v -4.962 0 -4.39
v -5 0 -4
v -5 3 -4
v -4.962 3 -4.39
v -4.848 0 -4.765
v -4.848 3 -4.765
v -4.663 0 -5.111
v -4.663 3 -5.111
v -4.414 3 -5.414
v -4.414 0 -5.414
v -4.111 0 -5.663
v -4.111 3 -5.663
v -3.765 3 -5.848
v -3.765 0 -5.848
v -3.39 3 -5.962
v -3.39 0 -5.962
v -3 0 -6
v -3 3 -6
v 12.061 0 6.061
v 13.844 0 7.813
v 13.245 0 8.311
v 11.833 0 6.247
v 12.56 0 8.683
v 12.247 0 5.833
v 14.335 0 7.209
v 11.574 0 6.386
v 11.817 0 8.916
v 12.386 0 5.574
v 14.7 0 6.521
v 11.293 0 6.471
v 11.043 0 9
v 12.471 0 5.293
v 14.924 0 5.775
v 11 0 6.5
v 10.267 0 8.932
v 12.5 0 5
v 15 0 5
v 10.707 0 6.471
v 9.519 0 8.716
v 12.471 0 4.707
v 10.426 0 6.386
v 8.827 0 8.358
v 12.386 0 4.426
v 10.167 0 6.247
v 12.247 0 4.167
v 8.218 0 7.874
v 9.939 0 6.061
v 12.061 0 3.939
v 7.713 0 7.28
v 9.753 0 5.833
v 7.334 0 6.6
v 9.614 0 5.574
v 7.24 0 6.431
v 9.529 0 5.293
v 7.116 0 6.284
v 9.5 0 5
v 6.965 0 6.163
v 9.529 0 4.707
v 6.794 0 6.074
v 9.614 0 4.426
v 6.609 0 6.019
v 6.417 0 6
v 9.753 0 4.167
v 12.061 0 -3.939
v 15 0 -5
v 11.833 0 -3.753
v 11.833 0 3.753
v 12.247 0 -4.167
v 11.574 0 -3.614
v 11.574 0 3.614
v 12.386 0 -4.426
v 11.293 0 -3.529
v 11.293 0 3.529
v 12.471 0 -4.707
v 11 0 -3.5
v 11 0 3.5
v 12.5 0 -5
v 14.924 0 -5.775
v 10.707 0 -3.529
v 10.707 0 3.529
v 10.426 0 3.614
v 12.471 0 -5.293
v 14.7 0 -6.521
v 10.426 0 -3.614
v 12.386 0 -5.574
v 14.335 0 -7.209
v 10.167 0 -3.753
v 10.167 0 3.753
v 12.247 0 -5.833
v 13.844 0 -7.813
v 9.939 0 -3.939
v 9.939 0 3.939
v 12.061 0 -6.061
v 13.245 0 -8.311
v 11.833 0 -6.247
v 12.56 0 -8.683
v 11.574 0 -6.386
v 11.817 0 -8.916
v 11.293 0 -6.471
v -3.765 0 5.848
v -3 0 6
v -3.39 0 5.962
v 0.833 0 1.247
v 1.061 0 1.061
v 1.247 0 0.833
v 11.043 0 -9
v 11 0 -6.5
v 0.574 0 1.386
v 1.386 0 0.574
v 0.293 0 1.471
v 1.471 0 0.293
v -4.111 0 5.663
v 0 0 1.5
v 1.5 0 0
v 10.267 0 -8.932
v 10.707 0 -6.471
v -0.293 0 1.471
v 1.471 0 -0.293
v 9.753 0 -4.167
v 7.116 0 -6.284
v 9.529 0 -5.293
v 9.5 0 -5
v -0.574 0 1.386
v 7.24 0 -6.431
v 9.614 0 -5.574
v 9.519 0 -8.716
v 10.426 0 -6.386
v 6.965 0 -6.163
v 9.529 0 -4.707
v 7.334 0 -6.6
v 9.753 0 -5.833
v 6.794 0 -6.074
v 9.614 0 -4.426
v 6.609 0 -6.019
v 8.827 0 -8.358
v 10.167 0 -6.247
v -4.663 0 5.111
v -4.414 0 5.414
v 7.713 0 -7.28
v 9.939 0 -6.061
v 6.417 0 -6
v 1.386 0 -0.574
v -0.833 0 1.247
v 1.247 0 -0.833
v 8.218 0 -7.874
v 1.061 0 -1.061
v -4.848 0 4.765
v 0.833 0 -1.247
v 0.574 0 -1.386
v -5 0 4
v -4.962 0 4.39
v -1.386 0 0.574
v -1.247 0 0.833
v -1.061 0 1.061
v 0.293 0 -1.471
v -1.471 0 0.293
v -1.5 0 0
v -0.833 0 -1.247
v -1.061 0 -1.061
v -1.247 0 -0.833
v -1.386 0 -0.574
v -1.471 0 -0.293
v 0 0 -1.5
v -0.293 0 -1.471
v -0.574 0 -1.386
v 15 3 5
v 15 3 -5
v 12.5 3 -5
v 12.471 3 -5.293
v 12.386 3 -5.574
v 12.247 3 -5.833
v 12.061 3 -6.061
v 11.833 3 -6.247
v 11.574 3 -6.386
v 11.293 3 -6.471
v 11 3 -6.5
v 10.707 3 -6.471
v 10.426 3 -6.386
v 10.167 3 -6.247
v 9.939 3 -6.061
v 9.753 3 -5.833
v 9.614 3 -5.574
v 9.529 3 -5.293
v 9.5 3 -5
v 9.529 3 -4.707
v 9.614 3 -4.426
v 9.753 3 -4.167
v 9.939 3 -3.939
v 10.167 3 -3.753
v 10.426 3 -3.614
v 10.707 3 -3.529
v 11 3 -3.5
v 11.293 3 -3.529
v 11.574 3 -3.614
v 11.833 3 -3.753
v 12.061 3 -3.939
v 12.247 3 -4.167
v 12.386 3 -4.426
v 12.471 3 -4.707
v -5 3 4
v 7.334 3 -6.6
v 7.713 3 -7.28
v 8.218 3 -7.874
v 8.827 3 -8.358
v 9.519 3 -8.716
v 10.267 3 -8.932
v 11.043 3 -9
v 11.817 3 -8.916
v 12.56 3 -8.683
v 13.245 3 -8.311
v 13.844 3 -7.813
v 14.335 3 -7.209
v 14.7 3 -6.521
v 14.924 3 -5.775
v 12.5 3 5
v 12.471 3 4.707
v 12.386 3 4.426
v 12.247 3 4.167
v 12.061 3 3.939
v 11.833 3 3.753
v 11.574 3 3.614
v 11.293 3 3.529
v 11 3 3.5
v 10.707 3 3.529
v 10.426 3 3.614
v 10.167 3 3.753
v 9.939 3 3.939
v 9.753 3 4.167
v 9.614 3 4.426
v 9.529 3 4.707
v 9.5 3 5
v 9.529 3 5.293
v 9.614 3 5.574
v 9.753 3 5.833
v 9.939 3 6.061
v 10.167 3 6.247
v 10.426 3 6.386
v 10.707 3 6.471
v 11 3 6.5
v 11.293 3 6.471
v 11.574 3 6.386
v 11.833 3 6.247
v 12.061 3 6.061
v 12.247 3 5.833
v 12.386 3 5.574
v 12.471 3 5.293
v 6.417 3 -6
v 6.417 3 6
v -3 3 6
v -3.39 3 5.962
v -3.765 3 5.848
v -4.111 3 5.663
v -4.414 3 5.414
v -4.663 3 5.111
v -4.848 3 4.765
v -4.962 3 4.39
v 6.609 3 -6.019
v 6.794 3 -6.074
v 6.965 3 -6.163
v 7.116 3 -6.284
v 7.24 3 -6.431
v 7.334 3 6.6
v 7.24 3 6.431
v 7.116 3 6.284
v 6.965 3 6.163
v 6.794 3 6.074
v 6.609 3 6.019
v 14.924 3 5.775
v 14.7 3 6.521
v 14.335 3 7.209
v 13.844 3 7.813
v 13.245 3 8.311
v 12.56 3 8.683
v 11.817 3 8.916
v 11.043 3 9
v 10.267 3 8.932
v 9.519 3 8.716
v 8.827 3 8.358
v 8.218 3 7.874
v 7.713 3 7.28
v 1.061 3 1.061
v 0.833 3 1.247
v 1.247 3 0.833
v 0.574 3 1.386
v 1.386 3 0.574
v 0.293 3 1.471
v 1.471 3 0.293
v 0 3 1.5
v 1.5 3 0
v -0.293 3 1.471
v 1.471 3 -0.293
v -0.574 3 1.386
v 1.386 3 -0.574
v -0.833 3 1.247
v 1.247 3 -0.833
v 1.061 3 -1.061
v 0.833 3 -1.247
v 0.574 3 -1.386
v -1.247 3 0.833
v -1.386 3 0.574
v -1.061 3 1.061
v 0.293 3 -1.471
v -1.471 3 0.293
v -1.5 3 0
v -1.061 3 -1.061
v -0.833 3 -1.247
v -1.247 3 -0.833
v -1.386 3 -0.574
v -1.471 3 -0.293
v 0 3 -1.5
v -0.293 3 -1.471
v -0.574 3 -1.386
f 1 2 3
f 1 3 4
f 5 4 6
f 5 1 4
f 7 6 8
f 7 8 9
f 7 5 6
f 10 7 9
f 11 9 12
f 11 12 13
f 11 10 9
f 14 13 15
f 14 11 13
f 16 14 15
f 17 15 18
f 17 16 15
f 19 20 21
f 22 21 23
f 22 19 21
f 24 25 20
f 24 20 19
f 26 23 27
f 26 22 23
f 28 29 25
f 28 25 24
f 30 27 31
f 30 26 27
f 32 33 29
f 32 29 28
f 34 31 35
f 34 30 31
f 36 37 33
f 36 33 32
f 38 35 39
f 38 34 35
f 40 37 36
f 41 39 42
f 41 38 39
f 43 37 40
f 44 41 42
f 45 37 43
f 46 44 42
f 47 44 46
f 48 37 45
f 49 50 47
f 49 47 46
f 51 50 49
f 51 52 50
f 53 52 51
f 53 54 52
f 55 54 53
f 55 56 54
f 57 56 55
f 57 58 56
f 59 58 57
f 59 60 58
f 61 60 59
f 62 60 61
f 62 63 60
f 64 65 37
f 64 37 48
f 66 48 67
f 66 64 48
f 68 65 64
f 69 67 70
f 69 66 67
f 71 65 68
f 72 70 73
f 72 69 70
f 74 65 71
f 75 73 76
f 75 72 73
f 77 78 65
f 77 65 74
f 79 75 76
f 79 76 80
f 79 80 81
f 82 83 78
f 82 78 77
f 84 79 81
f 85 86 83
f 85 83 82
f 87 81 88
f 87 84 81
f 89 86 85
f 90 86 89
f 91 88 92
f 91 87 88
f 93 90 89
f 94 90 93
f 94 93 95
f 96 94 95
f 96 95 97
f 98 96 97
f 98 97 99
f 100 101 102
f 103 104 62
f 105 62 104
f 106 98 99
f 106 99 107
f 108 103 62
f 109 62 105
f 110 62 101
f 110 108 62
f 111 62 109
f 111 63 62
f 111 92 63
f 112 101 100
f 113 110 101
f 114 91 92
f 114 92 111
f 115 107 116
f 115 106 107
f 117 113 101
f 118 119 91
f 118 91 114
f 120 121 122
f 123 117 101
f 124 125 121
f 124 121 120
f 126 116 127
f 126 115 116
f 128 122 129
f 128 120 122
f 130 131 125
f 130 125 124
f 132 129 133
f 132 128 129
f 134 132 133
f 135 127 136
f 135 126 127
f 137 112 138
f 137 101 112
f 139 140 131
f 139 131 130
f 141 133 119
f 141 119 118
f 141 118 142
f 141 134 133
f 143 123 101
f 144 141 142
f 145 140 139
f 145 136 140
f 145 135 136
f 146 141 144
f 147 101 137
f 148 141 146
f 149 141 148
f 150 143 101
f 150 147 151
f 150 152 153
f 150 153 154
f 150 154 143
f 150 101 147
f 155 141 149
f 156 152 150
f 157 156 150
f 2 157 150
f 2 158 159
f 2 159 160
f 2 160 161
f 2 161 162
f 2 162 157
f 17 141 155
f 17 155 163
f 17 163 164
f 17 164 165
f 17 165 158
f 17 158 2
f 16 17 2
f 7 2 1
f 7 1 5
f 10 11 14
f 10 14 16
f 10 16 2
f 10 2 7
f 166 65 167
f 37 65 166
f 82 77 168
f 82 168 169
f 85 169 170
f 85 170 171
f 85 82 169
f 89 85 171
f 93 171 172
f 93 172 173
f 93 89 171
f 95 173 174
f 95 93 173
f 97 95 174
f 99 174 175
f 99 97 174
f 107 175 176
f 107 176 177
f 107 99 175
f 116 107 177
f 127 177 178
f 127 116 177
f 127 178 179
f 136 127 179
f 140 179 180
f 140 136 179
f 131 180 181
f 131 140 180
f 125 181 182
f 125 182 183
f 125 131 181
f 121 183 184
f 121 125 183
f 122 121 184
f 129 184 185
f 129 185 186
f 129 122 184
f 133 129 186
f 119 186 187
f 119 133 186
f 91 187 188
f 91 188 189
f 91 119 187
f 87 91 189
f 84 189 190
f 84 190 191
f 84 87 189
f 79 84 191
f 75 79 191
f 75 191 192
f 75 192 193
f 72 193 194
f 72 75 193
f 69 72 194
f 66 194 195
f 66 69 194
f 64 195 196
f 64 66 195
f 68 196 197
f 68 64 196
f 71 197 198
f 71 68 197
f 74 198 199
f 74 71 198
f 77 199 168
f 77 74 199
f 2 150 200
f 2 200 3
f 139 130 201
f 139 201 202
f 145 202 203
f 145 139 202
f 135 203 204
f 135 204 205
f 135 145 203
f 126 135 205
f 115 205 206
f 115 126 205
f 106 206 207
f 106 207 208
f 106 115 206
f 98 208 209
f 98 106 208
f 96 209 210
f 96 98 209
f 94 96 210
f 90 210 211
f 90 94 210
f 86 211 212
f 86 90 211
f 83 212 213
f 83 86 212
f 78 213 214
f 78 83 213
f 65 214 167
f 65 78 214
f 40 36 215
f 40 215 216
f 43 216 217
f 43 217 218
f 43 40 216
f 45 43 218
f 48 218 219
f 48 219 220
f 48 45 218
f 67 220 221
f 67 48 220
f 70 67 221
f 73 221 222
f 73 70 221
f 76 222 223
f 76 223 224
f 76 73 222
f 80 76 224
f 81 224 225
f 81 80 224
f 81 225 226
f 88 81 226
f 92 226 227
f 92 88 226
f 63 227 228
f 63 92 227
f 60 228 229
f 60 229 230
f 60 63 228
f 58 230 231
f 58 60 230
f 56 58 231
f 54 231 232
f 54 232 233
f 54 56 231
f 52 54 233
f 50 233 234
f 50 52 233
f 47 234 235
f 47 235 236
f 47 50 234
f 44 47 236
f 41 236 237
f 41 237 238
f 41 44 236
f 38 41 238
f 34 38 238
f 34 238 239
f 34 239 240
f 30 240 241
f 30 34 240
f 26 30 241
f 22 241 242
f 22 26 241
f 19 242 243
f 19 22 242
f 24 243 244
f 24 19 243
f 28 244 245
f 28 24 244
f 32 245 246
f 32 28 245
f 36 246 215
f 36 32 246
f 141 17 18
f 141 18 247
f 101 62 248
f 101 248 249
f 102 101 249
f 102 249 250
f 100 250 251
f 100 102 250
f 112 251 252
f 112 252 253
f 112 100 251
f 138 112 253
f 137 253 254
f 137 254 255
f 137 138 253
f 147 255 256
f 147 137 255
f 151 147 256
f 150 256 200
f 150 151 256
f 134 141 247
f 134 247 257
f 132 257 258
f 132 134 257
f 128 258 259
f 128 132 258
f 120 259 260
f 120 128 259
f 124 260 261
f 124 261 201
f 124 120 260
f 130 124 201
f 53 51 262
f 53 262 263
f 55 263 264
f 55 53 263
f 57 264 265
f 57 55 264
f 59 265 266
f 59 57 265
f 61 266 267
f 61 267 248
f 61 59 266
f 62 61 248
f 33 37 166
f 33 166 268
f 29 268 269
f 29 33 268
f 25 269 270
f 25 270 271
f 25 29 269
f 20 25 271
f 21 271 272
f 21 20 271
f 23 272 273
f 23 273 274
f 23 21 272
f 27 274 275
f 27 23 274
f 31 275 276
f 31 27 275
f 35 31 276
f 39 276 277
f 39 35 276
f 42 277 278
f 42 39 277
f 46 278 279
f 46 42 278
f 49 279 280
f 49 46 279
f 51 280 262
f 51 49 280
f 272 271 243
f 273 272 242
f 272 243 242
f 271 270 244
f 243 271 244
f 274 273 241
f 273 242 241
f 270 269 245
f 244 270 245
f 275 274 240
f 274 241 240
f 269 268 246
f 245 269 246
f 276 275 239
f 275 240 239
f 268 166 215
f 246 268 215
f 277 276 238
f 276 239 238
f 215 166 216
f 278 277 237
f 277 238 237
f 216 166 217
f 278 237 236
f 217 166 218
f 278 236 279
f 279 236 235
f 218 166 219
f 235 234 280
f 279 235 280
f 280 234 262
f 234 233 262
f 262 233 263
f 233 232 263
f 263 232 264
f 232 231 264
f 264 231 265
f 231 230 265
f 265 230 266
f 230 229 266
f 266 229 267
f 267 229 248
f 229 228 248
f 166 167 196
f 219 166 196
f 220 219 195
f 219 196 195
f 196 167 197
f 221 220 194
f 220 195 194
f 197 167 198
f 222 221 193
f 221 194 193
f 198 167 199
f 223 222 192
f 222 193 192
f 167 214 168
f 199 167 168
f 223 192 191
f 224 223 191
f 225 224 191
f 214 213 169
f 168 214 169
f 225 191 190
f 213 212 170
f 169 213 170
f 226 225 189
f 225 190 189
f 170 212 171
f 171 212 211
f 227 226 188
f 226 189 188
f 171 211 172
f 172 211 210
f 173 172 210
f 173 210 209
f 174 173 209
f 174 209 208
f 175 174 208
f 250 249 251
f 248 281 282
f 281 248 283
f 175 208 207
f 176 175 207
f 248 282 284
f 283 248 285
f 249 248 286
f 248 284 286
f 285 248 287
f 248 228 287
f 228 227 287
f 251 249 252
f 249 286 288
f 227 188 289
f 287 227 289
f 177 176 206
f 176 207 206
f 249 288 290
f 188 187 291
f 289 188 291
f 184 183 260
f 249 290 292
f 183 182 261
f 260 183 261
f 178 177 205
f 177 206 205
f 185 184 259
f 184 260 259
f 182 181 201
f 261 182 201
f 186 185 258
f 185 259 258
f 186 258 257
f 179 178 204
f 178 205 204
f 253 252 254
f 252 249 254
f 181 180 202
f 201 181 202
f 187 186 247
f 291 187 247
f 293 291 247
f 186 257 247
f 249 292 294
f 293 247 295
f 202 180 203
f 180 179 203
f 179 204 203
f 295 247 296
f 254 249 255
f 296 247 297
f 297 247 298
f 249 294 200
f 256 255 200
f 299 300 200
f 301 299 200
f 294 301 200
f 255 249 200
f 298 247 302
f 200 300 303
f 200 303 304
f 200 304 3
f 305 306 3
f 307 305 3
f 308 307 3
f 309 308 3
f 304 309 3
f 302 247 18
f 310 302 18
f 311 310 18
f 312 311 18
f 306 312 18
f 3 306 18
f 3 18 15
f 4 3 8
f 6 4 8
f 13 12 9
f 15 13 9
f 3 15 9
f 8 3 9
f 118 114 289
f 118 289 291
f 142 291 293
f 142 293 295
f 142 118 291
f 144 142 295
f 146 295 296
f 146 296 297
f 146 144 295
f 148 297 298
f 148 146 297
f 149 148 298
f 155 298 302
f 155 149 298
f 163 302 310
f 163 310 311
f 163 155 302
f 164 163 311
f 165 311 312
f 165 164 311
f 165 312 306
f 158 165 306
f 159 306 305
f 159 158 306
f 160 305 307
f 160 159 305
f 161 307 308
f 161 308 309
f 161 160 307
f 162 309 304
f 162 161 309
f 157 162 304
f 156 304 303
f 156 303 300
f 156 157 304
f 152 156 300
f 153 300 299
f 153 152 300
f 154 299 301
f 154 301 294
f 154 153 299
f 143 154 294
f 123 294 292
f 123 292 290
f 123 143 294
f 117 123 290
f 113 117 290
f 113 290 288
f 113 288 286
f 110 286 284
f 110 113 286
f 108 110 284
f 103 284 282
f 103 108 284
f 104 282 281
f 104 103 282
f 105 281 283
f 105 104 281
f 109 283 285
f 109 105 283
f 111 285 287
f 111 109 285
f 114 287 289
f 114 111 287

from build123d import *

# Parameters (mm, degrees)
SKETCH1_R           = 1.5
BOSS_EXTRUDE1_DEPTH = 3


with BuildPart() as part:
    # Sketch1 → Boss-Extrude1 (new body)
    with BuildSketch(Plane(origin=(0, 0, 0), x_dir=(1, 0, 0), z_dir=(0, 1, 0))):
        with BuildLine():
            Line((15, 5), (15, -5))
            ThreePointArc((15, -5), (11.817238575, -8.915625252), (7.333939444, -6.6))
            ThreePointArc((7.333939444, -6.6), (6.965146863, -6.163339973), (6.417424305, -6))
            Line((6.417424305, -6), (-3, -6))
            ThreePointArc((-3, -6), (-4.414213562, -5.414213562), (-5, -4))
            Line((-5, -4), (-5, 4))
            ThreePointArc((-5, 4), (-4.414213562, 5.414213562), (-3, 6))
            Line((-3, 6), (6.417424305, 6))
            ThreePointArc((6.417424305, 6), (6.965146863, 6.163339973), (7.333939444, 6.6))
            ThreePointArc((7.333939444, 6.6), (11.817238575, 8.915625252), (15, 5))
        make_face()
        Circle(SKETCH1_R, mode=Mode.SUBTRACT)
        with Locations((11, 5)):
            Circle(SKETCH1_R, mode=Mode.SUBTRACT)
        with Locations((11, -5)):
            Circle(SKETCH1_R, mode=Mode.SUBTRACT)
    extrude(amount=BOSS_EXTRUDE1_DEPTH)


solid = part.part
